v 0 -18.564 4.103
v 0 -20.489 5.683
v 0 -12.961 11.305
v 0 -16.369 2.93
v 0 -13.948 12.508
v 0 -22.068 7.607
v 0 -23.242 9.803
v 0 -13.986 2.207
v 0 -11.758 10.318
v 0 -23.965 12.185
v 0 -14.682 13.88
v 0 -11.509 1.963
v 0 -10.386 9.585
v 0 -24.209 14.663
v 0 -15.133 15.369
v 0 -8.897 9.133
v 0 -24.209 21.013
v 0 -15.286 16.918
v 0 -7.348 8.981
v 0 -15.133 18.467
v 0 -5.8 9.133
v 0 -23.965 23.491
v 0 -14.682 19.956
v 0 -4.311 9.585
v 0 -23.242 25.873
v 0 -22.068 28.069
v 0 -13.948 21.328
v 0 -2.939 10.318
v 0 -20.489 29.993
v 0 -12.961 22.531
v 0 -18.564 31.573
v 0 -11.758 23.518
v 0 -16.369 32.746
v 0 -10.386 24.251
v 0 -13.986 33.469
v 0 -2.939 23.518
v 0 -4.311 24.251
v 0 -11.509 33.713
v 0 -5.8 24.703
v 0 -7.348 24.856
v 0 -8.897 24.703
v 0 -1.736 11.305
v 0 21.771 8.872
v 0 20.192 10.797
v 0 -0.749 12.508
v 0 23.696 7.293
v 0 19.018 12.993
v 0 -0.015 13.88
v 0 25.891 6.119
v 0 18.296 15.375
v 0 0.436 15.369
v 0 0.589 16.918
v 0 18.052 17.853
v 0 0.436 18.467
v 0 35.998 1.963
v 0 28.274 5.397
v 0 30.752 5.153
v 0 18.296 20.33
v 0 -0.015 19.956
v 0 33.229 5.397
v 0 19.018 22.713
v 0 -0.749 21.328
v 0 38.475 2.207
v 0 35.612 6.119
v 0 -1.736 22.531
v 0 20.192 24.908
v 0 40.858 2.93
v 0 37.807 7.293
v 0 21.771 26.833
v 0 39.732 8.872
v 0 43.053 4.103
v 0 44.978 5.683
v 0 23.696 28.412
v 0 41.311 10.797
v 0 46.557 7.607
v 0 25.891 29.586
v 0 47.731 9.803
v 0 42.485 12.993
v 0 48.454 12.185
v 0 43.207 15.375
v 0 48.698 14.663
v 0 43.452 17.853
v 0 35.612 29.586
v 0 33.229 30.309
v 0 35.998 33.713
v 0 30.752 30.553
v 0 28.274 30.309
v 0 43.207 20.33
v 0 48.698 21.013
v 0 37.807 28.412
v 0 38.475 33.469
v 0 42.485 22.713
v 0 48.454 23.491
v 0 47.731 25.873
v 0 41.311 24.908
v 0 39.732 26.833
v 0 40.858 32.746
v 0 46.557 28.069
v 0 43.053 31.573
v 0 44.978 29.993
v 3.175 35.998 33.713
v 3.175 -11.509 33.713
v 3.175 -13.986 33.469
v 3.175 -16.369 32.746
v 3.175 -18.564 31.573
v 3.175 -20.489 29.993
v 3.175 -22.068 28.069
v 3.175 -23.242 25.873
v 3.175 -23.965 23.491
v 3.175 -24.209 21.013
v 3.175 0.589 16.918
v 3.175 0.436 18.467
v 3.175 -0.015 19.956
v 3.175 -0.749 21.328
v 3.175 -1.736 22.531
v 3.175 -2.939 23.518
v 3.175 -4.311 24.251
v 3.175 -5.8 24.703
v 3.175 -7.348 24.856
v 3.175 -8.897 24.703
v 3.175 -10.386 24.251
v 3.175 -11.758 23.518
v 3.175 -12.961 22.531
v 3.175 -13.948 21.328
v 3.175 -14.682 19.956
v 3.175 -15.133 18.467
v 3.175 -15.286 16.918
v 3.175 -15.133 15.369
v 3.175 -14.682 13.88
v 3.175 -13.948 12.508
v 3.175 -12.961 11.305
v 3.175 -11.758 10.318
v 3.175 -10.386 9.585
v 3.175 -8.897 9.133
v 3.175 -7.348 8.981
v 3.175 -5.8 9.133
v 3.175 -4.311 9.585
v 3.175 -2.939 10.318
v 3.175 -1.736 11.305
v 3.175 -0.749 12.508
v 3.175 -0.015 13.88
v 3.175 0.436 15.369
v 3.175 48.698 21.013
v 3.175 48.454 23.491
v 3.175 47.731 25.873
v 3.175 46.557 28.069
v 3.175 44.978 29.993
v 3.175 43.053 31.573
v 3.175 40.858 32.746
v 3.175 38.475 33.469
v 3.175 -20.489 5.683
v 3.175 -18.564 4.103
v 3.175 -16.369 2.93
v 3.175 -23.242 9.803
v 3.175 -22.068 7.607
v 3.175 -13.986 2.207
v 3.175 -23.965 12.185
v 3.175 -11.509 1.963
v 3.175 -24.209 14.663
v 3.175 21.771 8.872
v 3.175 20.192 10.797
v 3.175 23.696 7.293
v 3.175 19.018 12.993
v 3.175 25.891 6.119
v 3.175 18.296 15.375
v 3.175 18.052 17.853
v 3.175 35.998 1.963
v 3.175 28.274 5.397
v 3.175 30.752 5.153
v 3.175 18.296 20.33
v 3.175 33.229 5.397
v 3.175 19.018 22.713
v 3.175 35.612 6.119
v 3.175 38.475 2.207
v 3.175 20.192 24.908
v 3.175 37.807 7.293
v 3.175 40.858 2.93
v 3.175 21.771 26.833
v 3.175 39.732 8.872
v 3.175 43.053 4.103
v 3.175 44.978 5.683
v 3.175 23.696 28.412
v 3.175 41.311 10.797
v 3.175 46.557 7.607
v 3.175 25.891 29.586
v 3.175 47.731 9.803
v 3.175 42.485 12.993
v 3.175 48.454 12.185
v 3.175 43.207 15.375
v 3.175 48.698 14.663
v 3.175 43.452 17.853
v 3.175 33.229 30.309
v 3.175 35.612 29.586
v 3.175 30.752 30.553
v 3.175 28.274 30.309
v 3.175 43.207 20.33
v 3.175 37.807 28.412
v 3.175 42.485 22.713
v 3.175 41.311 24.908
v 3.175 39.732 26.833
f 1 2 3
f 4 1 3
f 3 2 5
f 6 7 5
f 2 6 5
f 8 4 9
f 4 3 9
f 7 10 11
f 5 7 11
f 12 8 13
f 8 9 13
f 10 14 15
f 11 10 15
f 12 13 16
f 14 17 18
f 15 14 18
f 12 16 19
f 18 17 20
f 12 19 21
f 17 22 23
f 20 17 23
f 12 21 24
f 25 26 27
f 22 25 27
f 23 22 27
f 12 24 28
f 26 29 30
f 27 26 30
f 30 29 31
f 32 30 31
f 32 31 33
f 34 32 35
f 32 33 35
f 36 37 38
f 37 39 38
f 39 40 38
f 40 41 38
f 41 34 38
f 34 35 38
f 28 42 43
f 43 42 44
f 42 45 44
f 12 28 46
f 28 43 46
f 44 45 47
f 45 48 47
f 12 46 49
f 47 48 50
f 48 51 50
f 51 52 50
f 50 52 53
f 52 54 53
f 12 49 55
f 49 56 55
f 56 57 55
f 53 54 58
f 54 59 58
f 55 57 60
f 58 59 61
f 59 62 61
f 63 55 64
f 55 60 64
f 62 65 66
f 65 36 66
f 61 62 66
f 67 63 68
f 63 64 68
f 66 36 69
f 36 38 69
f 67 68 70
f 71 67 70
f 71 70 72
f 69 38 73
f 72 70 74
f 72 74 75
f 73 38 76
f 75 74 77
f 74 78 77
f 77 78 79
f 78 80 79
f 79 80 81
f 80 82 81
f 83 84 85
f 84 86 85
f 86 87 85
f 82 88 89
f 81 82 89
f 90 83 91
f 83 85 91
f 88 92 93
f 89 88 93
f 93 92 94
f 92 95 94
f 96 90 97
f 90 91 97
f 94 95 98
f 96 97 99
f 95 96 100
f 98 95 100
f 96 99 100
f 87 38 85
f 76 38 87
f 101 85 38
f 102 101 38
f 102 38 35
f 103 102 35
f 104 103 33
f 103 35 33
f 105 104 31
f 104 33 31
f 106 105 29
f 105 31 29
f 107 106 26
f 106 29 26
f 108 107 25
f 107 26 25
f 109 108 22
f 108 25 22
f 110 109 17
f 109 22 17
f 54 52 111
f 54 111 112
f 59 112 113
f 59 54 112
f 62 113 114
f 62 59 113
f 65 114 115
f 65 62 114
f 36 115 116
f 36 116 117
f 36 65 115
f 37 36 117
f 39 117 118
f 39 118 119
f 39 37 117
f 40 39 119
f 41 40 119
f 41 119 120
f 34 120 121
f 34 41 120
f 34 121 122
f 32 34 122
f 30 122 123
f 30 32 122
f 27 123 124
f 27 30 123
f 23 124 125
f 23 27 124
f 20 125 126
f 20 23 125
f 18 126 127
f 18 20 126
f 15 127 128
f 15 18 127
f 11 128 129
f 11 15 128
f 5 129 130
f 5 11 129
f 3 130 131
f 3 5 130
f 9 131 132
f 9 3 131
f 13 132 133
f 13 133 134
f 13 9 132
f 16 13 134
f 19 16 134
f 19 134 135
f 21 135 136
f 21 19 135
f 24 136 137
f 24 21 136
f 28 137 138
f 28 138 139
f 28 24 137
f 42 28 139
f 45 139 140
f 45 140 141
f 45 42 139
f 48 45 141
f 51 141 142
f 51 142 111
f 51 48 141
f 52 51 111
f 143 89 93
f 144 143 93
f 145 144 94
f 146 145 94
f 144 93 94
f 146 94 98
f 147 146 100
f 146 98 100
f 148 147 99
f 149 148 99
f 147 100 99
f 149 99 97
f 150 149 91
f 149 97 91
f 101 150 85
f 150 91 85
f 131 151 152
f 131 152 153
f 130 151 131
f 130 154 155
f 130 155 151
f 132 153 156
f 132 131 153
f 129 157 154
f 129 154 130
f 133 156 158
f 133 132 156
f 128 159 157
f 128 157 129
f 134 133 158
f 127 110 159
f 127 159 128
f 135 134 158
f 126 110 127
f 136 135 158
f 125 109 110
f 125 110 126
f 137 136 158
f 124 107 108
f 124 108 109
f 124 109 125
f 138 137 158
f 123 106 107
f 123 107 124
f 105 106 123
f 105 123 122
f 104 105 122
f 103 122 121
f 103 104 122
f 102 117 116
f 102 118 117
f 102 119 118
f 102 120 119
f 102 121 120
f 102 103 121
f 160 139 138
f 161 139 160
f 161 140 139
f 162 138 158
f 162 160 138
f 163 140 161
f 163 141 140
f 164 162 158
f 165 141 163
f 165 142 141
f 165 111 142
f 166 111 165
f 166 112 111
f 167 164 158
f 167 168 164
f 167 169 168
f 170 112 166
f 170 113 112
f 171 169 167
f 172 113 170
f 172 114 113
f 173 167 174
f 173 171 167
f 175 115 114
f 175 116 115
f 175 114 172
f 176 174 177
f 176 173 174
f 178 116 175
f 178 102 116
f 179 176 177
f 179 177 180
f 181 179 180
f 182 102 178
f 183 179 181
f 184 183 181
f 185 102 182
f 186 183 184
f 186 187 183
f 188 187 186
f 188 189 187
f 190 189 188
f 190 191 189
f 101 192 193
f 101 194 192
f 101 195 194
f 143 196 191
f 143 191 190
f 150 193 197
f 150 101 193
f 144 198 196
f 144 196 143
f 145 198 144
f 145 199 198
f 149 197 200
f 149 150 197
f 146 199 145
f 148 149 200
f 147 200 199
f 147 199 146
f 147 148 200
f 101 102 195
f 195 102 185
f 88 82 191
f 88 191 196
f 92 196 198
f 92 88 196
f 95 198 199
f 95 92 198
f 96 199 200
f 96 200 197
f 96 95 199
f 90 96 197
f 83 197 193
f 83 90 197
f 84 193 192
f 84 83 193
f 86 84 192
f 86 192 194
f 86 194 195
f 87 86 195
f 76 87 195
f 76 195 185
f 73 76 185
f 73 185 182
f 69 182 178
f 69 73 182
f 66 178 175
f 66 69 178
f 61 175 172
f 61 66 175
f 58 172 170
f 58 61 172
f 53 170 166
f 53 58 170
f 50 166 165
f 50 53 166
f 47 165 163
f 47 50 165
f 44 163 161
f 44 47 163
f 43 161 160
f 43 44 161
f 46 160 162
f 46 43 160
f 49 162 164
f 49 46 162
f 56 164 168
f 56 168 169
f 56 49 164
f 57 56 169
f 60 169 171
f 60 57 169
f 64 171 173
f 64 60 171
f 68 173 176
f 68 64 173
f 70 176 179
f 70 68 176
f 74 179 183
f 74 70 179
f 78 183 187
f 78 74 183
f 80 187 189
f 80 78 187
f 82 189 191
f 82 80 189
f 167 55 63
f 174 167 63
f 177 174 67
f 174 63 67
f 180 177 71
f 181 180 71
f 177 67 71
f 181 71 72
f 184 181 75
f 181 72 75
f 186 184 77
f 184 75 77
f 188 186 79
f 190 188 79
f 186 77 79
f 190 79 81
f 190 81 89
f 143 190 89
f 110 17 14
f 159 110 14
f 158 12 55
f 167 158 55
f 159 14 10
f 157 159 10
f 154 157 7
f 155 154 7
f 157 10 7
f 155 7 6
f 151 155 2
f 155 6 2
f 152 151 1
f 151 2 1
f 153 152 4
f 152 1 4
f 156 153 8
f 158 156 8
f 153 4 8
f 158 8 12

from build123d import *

# Parameters (mm, degrees)
F0_R     = 7.9375
F0_R_2   = 12.7
F1_DEPTH = 3.175


# Not quite as in the source:
# - a length typed as a fraction of an inch, garbled in the dataset ("3 / 203.2 mm" for 3/8 in), is restored


with BuildPart() as f1:
    # F0 (on Right) → F1 (new body)
    with BuildSketch(Plane.YZ):
        with BuildLine():
            Line((35.9976727843, 33.7128622103), (-11.5086332291, 33.7128622103))
            ThreePointArc((-11.5086332291, 33.7128622103), (-20.4888893502, 29.9931183314), (-24.2086332291, 21.0128622103))
            Line((-24.2086332291, 21.0128622103), (-24.2086332291, 14.6628622103))
            ThreePointArc((-24.2086332291, 14.6628622103), (-20.4888893502, 5.6826060893), (-11.5086332291, 1.9628622103))
            Line((-11.5086332291, 1.9628622103), (35.9976727843, 1.9628622103))
            ThreePointArc((35.9976727843, 1.9628622103), (44.9779289054, 5.6826060893), (48.6976727843, 14.6628622103))
            Line((48.6976727843, 14.6628622103), (48.6976727843, 21.0128622103))
            ThreePointArc((48.6976727843, 21.0128622103), (44.9779289054, 29.9931183314), (35.9976727843, 33.7128622103))
        make_face()
        with Locations((-7.3484922707, 16.9180016965)):
            Circle(F0_R, mode=Mode.SUBTRACT)
        with Locations((30.7515077293, 17.8526993841)):
            Circle(F0_R_2, mode=Mode.SUBTRACT)
    extrude(amount=F1_DEPTH)


solid = f1.part
